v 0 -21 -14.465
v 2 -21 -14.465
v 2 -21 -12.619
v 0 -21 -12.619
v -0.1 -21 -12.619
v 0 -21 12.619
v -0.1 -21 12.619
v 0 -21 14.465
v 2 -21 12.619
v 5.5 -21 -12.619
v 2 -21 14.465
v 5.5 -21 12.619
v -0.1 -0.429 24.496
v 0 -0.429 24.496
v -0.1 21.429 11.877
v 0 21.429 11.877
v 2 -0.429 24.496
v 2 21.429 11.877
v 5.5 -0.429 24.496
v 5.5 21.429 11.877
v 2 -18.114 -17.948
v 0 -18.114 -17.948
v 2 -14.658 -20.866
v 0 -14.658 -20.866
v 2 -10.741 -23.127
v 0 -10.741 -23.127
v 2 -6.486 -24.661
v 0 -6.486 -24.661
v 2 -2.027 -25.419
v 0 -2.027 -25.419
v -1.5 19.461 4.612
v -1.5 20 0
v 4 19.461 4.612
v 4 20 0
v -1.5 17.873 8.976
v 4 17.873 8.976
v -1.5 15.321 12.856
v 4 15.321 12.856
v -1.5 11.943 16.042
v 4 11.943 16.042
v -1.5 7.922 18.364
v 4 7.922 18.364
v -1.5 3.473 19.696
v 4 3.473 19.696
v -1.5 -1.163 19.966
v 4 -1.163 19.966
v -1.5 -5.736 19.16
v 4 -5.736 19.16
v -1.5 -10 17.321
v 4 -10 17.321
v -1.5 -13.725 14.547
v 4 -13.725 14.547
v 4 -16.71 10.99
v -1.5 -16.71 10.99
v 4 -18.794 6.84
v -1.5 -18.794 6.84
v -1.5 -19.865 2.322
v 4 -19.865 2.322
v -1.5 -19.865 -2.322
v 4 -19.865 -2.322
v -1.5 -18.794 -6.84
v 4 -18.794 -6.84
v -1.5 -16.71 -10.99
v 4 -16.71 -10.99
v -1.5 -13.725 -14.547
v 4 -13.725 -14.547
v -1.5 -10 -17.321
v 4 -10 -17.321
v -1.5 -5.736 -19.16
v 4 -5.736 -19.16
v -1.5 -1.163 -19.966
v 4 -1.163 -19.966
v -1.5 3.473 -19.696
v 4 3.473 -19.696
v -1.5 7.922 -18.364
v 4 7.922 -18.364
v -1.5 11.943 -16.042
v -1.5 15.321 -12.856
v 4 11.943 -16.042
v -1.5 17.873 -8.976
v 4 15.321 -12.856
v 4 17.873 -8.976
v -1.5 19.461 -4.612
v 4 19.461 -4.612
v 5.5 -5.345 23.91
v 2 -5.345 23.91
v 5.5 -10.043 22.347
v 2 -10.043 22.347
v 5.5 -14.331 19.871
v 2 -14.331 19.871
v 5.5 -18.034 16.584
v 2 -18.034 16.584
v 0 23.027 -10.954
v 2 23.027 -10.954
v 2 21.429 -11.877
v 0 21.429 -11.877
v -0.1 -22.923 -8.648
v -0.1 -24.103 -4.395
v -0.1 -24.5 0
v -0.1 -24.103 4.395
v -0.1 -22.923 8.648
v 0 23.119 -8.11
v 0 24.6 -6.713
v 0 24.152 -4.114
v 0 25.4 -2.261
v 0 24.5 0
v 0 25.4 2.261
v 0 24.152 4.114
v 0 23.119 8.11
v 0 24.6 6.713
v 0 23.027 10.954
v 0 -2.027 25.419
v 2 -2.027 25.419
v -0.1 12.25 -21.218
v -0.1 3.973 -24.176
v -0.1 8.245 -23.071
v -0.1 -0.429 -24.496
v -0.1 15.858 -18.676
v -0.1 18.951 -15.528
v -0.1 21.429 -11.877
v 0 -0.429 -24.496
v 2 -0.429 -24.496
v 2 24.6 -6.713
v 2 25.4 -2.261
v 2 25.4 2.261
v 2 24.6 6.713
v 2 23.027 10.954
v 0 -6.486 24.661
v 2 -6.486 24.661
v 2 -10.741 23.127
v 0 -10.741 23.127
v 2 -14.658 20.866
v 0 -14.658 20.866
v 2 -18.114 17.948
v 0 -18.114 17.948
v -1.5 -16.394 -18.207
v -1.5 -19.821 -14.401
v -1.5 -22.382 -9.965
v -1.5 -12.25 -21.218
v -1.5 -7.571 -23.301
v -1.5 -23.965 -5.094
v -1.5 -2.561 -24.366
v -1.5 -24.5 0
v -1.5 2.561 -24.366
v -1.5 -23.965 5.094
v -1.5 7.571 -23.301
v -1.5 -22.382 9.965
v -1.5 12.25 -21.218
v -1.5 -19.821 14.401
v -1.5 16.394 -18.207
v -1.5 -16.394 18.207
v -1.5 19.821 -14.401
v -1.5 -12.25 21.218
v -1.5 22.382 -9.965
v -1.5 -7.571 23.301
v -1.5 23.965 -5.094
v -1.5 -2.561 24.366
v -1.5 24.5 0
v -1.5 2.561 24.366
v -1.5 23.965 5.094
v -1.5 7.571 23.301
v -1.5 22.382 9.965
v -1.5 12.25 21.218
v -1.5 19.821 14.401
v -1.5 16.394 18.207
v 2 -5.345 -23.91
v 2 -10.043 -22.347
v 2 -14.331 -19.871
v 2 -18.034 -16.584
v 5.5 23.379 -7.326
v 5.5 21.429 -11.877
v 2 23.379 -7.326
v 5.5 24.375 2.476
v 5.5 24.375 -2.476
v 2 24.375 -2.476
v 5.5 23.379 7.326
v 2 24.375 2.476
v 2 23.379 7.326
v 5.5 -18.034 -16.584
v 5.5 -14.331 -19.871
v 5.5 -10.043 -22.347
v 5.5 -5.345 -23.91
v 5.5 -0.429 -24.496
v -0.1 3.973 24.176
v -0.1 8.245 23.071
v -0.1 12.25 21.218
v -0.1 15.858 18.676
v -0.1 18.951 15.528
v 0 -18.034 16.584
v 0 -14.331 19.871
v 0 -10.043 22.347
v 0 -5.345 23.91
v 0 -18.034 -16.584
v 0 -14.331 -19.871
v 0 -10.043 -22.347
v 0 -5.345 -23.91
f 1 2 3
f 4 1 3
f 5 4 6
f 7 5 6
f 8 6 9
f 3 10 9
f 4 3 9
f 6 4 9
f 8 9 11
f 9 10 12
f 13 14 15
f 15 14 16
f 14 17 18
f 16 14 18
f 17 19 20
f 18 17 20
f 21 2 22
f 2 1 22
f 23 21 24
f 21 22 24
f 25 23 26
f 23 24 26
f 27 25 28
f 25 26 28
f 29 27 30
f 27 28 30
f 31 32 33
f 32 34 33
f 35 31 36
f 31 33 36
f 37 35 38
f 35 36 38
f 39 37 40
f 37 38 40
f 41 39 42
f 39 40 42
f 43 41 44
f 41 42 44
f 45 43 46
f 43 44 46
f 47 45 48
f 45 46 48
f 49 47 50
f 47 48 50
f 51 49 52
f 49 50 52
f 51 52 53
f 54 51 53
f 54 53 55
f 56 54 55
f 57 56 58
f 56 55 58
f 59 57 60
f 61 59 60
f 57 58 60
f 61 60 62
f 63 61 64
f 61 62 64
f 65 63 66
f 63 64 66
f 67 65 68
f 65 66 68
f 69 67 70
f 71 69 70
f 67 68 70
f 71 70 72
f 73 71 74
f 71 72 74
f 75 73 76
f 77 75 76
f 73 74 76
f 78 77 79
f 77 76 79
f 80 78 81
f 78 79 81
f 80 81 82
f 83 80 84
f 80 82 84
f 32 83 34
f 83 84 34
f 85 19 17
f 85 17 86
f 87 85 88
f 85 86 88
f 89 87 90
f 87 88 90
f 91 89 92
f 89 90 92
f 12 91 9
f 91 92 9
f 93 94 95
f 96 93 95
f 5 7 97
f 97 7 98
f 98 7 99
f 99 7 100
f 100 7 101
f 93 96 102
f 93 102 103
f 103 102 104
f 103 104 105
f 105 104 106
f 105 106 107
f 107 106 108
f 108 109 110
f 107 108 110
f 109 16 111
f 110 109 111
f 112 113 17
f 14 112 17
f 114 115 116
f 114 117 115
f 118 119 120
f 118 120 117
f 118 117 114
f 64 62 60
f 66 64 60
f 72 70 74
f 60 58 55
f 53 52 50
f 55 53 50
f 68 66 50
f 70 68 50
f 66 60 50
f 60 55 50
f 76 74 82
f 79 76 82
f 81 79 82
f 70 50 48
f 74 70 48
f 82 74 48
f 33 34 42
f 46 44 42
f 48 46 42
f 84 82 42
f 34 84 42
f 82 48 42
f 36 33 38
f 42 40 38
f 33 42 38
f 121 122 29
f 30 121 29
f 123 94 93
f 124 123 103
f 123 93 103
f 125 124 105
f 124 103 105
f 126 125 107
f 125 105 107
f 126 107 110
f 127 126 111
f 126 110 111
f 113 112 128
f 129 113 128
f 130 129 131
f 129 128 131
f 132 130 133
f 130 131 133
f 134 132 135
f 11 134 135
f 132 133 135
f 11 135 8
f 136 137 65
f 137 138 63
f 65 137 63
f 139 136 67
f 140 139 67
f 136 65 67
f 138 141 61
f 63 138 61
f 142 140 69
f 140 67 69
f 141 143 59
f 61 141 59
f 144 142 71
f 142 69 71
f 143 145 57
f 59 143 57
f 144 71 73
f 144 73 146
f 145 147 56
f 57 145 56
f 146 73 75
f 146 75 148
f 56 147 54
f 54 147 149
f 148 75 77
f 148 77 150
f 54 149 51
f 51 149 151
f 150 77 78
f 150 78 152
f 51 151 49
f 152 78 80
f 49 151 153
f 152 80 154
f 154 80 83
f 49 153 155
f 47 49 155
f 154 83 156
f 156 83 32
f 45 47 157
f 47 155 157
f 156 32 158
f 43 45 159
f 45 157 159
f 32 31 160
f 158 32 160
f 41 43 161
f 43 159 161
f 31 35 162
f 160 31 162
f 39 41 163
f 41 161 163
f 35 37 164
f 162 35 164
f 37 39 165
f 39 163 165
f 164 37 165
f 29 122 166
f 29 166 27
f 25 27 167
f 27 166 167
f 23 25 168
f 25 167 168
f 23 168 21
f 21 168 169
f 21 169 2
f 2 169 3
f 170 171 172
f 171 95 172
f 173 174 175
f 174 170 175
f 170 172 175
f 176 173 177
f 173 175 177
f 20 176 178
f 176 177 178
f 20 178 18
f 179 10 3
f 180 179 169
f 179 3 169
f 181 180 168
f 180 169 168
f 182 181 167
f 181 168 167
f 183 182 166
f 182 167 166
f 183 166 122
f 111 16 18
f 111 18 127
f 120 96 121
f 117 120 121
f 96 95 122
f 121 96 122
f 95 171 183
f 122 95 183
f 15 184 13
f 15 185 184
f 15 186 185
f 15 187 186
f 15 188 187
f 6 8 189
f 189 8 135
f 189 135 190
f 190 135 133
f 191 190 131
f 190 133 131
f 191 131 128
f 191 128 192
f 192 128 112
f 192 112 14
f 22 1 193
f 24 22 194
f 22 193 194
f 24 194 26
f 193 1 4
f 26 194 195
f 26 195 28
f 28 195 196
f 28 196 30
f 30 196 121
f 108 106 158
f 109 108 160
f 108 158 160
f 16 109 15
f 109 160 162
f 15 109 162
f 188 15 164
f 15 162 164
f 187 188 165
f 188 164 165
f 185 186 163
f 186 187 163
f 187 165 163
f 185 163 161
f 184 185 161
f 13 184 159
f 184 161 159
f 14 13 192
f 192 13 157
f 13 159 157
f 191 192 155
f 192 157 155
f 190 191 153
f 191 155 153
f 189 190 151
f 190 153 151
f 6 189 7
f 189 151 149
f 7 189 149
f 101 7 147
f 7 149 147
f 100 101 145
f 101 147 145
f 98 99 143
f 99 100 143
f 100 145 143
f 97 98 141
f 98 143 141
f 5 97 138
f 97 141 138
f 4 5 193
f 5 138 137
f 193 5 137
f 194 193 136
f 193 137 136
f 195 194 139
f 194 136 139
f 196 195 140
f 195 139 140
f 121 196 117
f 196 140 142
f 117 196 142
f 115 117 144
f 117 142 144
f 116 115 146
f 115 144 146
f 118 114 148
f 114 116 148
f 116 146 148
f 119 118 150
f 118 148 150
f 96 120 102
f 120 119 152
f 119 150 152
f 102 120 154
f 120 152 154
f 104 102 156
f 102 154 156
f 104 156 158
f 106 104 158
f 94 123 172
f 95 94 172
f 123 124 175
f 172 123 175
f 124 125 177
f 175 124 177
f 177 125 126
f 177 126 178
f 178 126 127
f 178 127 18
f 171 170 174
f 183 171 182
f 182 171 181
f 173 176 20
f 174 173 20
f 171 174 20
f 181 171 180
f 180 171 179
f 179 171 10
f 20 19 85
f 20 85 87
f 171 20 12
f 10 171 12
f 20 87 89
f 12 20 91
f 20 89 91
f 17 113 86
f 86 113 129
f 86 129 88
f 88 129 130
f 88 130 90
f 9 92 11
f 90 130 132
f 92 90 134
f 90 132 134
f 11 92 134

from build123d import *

# Parameters (mm, degrees)
CUT_EXTRUDE_1_DEPTH      = 4.5
CUT_EXTRUDE_1_DEPTH_BACK = 2.1


with BuildPart() as part:
    # Эскиз1 → Повернуть1 (revolve)
    with BuildSketch(Plane.XY):
        Polygon((-1.5, 24.5), (-1.5, 20), (4, 20), (4, 0), (5.5, 0), (5.5, 24.5), (2, 24.5), (2, 25.5), (0, 25.5), (0, 24.5), align=None)
    revolve(axis=Axis((-6.564956253, 0, 0), (1, 0, 0)))

    # Эскиз2 → Вырез-Вытянуть1 (cut, two sides)
    with BuildSketch(Plane(origin=(2, 0, 0), x_dir=(0, 0, -1), z_dir=(1, 0, 0))) as cut_extrude_1_sk:
        with BuildLine():
            ThreePointArc((-10.953795409, 23.027469816), (-22.083647797, 12.75), (-25.41927155, -2.027469816))
            Line((-25.41927155, -2.027469816), (-24.496248212, -0.428746497))
            ThreePointArc((-24.496248212, -0.428746497), (-21.217622393, 12.25), (-11.876818747, 21.428746497))
            Line((-11.876818747, 21.428746497), (-10.953795409, 23.027469816))
        make_face()
        with BuildLine():
            ThreePointArc((-11.876818747, 21.428746497), (-21.217622393, 12.25), (-24.496248212, -0.428746497))
            Line((-24.496248212, -0.428746497), (-11.876818747, 21.428746497))
        make_face()
        with BuildLine():
            Line((12.619429464, -21), (-12.619429464, -21))
            ThreePointArc((-12.619429464, -21), (0, -24.5), (12.619429464, -21))
        make_face()
        with BuildLine():
            Line((-12.619429464, -21), (-14.465476141, -21))
            ThreePointArc((-14.465476141, -21), (0, -25.5), (14.465476141, -21))
            Line((14.465476141, -21), (12.619429464, -21))
            ThreePointArc((12.619429464, -21), (0, -24.5), (-12.619429464, -21))
        make_face()
        with BuildLine():
            ThreePointArc((24.5, 0), (21.109619363, 12.435190804), (11.876818747, 21.428746497))
            Line((11.876818747, 21.428746497), (24.496248212, -0.428746497))
            ThreePointArc((24.496248212, -0.428746497), (24.499062035, -0.214381456), (24.5, 0))
        make_face()
        with BuildLine():
            ThreePointArc((25.5, 0), (21.558893558, 13.618520791), (10.953795409, 23.027469816))
            Line((10.953795409, 23.027469816), (11.876818747, 21.428746497))
            ThreePointArc((11.876818747, 21.428746497), (21.109619363, 12.435190804), (24.5, 0))
            ThreePointArc((24.5, 0), (24.499062035, -0.214381456), (24.496248212, -0.428746497))
            Line((24.496248212, -0.428746497), (25.41927155, -2.027469816))
            ThreePointArc((25.41927155, -2.027469816), (25.479809895, -1.014538188), (25.5, 0))
        make_face()
    extrude(amount=CUT_EXTRUDE_1_DEPTH, mode=Mode.SUBTRACT)
    extrude(cut_extrude_1_sk.sketch, amount=-CUT_EXTRUDE_1_DEPTH_BACK, mode=Mode.SUBTRACT)


solid = part.part
